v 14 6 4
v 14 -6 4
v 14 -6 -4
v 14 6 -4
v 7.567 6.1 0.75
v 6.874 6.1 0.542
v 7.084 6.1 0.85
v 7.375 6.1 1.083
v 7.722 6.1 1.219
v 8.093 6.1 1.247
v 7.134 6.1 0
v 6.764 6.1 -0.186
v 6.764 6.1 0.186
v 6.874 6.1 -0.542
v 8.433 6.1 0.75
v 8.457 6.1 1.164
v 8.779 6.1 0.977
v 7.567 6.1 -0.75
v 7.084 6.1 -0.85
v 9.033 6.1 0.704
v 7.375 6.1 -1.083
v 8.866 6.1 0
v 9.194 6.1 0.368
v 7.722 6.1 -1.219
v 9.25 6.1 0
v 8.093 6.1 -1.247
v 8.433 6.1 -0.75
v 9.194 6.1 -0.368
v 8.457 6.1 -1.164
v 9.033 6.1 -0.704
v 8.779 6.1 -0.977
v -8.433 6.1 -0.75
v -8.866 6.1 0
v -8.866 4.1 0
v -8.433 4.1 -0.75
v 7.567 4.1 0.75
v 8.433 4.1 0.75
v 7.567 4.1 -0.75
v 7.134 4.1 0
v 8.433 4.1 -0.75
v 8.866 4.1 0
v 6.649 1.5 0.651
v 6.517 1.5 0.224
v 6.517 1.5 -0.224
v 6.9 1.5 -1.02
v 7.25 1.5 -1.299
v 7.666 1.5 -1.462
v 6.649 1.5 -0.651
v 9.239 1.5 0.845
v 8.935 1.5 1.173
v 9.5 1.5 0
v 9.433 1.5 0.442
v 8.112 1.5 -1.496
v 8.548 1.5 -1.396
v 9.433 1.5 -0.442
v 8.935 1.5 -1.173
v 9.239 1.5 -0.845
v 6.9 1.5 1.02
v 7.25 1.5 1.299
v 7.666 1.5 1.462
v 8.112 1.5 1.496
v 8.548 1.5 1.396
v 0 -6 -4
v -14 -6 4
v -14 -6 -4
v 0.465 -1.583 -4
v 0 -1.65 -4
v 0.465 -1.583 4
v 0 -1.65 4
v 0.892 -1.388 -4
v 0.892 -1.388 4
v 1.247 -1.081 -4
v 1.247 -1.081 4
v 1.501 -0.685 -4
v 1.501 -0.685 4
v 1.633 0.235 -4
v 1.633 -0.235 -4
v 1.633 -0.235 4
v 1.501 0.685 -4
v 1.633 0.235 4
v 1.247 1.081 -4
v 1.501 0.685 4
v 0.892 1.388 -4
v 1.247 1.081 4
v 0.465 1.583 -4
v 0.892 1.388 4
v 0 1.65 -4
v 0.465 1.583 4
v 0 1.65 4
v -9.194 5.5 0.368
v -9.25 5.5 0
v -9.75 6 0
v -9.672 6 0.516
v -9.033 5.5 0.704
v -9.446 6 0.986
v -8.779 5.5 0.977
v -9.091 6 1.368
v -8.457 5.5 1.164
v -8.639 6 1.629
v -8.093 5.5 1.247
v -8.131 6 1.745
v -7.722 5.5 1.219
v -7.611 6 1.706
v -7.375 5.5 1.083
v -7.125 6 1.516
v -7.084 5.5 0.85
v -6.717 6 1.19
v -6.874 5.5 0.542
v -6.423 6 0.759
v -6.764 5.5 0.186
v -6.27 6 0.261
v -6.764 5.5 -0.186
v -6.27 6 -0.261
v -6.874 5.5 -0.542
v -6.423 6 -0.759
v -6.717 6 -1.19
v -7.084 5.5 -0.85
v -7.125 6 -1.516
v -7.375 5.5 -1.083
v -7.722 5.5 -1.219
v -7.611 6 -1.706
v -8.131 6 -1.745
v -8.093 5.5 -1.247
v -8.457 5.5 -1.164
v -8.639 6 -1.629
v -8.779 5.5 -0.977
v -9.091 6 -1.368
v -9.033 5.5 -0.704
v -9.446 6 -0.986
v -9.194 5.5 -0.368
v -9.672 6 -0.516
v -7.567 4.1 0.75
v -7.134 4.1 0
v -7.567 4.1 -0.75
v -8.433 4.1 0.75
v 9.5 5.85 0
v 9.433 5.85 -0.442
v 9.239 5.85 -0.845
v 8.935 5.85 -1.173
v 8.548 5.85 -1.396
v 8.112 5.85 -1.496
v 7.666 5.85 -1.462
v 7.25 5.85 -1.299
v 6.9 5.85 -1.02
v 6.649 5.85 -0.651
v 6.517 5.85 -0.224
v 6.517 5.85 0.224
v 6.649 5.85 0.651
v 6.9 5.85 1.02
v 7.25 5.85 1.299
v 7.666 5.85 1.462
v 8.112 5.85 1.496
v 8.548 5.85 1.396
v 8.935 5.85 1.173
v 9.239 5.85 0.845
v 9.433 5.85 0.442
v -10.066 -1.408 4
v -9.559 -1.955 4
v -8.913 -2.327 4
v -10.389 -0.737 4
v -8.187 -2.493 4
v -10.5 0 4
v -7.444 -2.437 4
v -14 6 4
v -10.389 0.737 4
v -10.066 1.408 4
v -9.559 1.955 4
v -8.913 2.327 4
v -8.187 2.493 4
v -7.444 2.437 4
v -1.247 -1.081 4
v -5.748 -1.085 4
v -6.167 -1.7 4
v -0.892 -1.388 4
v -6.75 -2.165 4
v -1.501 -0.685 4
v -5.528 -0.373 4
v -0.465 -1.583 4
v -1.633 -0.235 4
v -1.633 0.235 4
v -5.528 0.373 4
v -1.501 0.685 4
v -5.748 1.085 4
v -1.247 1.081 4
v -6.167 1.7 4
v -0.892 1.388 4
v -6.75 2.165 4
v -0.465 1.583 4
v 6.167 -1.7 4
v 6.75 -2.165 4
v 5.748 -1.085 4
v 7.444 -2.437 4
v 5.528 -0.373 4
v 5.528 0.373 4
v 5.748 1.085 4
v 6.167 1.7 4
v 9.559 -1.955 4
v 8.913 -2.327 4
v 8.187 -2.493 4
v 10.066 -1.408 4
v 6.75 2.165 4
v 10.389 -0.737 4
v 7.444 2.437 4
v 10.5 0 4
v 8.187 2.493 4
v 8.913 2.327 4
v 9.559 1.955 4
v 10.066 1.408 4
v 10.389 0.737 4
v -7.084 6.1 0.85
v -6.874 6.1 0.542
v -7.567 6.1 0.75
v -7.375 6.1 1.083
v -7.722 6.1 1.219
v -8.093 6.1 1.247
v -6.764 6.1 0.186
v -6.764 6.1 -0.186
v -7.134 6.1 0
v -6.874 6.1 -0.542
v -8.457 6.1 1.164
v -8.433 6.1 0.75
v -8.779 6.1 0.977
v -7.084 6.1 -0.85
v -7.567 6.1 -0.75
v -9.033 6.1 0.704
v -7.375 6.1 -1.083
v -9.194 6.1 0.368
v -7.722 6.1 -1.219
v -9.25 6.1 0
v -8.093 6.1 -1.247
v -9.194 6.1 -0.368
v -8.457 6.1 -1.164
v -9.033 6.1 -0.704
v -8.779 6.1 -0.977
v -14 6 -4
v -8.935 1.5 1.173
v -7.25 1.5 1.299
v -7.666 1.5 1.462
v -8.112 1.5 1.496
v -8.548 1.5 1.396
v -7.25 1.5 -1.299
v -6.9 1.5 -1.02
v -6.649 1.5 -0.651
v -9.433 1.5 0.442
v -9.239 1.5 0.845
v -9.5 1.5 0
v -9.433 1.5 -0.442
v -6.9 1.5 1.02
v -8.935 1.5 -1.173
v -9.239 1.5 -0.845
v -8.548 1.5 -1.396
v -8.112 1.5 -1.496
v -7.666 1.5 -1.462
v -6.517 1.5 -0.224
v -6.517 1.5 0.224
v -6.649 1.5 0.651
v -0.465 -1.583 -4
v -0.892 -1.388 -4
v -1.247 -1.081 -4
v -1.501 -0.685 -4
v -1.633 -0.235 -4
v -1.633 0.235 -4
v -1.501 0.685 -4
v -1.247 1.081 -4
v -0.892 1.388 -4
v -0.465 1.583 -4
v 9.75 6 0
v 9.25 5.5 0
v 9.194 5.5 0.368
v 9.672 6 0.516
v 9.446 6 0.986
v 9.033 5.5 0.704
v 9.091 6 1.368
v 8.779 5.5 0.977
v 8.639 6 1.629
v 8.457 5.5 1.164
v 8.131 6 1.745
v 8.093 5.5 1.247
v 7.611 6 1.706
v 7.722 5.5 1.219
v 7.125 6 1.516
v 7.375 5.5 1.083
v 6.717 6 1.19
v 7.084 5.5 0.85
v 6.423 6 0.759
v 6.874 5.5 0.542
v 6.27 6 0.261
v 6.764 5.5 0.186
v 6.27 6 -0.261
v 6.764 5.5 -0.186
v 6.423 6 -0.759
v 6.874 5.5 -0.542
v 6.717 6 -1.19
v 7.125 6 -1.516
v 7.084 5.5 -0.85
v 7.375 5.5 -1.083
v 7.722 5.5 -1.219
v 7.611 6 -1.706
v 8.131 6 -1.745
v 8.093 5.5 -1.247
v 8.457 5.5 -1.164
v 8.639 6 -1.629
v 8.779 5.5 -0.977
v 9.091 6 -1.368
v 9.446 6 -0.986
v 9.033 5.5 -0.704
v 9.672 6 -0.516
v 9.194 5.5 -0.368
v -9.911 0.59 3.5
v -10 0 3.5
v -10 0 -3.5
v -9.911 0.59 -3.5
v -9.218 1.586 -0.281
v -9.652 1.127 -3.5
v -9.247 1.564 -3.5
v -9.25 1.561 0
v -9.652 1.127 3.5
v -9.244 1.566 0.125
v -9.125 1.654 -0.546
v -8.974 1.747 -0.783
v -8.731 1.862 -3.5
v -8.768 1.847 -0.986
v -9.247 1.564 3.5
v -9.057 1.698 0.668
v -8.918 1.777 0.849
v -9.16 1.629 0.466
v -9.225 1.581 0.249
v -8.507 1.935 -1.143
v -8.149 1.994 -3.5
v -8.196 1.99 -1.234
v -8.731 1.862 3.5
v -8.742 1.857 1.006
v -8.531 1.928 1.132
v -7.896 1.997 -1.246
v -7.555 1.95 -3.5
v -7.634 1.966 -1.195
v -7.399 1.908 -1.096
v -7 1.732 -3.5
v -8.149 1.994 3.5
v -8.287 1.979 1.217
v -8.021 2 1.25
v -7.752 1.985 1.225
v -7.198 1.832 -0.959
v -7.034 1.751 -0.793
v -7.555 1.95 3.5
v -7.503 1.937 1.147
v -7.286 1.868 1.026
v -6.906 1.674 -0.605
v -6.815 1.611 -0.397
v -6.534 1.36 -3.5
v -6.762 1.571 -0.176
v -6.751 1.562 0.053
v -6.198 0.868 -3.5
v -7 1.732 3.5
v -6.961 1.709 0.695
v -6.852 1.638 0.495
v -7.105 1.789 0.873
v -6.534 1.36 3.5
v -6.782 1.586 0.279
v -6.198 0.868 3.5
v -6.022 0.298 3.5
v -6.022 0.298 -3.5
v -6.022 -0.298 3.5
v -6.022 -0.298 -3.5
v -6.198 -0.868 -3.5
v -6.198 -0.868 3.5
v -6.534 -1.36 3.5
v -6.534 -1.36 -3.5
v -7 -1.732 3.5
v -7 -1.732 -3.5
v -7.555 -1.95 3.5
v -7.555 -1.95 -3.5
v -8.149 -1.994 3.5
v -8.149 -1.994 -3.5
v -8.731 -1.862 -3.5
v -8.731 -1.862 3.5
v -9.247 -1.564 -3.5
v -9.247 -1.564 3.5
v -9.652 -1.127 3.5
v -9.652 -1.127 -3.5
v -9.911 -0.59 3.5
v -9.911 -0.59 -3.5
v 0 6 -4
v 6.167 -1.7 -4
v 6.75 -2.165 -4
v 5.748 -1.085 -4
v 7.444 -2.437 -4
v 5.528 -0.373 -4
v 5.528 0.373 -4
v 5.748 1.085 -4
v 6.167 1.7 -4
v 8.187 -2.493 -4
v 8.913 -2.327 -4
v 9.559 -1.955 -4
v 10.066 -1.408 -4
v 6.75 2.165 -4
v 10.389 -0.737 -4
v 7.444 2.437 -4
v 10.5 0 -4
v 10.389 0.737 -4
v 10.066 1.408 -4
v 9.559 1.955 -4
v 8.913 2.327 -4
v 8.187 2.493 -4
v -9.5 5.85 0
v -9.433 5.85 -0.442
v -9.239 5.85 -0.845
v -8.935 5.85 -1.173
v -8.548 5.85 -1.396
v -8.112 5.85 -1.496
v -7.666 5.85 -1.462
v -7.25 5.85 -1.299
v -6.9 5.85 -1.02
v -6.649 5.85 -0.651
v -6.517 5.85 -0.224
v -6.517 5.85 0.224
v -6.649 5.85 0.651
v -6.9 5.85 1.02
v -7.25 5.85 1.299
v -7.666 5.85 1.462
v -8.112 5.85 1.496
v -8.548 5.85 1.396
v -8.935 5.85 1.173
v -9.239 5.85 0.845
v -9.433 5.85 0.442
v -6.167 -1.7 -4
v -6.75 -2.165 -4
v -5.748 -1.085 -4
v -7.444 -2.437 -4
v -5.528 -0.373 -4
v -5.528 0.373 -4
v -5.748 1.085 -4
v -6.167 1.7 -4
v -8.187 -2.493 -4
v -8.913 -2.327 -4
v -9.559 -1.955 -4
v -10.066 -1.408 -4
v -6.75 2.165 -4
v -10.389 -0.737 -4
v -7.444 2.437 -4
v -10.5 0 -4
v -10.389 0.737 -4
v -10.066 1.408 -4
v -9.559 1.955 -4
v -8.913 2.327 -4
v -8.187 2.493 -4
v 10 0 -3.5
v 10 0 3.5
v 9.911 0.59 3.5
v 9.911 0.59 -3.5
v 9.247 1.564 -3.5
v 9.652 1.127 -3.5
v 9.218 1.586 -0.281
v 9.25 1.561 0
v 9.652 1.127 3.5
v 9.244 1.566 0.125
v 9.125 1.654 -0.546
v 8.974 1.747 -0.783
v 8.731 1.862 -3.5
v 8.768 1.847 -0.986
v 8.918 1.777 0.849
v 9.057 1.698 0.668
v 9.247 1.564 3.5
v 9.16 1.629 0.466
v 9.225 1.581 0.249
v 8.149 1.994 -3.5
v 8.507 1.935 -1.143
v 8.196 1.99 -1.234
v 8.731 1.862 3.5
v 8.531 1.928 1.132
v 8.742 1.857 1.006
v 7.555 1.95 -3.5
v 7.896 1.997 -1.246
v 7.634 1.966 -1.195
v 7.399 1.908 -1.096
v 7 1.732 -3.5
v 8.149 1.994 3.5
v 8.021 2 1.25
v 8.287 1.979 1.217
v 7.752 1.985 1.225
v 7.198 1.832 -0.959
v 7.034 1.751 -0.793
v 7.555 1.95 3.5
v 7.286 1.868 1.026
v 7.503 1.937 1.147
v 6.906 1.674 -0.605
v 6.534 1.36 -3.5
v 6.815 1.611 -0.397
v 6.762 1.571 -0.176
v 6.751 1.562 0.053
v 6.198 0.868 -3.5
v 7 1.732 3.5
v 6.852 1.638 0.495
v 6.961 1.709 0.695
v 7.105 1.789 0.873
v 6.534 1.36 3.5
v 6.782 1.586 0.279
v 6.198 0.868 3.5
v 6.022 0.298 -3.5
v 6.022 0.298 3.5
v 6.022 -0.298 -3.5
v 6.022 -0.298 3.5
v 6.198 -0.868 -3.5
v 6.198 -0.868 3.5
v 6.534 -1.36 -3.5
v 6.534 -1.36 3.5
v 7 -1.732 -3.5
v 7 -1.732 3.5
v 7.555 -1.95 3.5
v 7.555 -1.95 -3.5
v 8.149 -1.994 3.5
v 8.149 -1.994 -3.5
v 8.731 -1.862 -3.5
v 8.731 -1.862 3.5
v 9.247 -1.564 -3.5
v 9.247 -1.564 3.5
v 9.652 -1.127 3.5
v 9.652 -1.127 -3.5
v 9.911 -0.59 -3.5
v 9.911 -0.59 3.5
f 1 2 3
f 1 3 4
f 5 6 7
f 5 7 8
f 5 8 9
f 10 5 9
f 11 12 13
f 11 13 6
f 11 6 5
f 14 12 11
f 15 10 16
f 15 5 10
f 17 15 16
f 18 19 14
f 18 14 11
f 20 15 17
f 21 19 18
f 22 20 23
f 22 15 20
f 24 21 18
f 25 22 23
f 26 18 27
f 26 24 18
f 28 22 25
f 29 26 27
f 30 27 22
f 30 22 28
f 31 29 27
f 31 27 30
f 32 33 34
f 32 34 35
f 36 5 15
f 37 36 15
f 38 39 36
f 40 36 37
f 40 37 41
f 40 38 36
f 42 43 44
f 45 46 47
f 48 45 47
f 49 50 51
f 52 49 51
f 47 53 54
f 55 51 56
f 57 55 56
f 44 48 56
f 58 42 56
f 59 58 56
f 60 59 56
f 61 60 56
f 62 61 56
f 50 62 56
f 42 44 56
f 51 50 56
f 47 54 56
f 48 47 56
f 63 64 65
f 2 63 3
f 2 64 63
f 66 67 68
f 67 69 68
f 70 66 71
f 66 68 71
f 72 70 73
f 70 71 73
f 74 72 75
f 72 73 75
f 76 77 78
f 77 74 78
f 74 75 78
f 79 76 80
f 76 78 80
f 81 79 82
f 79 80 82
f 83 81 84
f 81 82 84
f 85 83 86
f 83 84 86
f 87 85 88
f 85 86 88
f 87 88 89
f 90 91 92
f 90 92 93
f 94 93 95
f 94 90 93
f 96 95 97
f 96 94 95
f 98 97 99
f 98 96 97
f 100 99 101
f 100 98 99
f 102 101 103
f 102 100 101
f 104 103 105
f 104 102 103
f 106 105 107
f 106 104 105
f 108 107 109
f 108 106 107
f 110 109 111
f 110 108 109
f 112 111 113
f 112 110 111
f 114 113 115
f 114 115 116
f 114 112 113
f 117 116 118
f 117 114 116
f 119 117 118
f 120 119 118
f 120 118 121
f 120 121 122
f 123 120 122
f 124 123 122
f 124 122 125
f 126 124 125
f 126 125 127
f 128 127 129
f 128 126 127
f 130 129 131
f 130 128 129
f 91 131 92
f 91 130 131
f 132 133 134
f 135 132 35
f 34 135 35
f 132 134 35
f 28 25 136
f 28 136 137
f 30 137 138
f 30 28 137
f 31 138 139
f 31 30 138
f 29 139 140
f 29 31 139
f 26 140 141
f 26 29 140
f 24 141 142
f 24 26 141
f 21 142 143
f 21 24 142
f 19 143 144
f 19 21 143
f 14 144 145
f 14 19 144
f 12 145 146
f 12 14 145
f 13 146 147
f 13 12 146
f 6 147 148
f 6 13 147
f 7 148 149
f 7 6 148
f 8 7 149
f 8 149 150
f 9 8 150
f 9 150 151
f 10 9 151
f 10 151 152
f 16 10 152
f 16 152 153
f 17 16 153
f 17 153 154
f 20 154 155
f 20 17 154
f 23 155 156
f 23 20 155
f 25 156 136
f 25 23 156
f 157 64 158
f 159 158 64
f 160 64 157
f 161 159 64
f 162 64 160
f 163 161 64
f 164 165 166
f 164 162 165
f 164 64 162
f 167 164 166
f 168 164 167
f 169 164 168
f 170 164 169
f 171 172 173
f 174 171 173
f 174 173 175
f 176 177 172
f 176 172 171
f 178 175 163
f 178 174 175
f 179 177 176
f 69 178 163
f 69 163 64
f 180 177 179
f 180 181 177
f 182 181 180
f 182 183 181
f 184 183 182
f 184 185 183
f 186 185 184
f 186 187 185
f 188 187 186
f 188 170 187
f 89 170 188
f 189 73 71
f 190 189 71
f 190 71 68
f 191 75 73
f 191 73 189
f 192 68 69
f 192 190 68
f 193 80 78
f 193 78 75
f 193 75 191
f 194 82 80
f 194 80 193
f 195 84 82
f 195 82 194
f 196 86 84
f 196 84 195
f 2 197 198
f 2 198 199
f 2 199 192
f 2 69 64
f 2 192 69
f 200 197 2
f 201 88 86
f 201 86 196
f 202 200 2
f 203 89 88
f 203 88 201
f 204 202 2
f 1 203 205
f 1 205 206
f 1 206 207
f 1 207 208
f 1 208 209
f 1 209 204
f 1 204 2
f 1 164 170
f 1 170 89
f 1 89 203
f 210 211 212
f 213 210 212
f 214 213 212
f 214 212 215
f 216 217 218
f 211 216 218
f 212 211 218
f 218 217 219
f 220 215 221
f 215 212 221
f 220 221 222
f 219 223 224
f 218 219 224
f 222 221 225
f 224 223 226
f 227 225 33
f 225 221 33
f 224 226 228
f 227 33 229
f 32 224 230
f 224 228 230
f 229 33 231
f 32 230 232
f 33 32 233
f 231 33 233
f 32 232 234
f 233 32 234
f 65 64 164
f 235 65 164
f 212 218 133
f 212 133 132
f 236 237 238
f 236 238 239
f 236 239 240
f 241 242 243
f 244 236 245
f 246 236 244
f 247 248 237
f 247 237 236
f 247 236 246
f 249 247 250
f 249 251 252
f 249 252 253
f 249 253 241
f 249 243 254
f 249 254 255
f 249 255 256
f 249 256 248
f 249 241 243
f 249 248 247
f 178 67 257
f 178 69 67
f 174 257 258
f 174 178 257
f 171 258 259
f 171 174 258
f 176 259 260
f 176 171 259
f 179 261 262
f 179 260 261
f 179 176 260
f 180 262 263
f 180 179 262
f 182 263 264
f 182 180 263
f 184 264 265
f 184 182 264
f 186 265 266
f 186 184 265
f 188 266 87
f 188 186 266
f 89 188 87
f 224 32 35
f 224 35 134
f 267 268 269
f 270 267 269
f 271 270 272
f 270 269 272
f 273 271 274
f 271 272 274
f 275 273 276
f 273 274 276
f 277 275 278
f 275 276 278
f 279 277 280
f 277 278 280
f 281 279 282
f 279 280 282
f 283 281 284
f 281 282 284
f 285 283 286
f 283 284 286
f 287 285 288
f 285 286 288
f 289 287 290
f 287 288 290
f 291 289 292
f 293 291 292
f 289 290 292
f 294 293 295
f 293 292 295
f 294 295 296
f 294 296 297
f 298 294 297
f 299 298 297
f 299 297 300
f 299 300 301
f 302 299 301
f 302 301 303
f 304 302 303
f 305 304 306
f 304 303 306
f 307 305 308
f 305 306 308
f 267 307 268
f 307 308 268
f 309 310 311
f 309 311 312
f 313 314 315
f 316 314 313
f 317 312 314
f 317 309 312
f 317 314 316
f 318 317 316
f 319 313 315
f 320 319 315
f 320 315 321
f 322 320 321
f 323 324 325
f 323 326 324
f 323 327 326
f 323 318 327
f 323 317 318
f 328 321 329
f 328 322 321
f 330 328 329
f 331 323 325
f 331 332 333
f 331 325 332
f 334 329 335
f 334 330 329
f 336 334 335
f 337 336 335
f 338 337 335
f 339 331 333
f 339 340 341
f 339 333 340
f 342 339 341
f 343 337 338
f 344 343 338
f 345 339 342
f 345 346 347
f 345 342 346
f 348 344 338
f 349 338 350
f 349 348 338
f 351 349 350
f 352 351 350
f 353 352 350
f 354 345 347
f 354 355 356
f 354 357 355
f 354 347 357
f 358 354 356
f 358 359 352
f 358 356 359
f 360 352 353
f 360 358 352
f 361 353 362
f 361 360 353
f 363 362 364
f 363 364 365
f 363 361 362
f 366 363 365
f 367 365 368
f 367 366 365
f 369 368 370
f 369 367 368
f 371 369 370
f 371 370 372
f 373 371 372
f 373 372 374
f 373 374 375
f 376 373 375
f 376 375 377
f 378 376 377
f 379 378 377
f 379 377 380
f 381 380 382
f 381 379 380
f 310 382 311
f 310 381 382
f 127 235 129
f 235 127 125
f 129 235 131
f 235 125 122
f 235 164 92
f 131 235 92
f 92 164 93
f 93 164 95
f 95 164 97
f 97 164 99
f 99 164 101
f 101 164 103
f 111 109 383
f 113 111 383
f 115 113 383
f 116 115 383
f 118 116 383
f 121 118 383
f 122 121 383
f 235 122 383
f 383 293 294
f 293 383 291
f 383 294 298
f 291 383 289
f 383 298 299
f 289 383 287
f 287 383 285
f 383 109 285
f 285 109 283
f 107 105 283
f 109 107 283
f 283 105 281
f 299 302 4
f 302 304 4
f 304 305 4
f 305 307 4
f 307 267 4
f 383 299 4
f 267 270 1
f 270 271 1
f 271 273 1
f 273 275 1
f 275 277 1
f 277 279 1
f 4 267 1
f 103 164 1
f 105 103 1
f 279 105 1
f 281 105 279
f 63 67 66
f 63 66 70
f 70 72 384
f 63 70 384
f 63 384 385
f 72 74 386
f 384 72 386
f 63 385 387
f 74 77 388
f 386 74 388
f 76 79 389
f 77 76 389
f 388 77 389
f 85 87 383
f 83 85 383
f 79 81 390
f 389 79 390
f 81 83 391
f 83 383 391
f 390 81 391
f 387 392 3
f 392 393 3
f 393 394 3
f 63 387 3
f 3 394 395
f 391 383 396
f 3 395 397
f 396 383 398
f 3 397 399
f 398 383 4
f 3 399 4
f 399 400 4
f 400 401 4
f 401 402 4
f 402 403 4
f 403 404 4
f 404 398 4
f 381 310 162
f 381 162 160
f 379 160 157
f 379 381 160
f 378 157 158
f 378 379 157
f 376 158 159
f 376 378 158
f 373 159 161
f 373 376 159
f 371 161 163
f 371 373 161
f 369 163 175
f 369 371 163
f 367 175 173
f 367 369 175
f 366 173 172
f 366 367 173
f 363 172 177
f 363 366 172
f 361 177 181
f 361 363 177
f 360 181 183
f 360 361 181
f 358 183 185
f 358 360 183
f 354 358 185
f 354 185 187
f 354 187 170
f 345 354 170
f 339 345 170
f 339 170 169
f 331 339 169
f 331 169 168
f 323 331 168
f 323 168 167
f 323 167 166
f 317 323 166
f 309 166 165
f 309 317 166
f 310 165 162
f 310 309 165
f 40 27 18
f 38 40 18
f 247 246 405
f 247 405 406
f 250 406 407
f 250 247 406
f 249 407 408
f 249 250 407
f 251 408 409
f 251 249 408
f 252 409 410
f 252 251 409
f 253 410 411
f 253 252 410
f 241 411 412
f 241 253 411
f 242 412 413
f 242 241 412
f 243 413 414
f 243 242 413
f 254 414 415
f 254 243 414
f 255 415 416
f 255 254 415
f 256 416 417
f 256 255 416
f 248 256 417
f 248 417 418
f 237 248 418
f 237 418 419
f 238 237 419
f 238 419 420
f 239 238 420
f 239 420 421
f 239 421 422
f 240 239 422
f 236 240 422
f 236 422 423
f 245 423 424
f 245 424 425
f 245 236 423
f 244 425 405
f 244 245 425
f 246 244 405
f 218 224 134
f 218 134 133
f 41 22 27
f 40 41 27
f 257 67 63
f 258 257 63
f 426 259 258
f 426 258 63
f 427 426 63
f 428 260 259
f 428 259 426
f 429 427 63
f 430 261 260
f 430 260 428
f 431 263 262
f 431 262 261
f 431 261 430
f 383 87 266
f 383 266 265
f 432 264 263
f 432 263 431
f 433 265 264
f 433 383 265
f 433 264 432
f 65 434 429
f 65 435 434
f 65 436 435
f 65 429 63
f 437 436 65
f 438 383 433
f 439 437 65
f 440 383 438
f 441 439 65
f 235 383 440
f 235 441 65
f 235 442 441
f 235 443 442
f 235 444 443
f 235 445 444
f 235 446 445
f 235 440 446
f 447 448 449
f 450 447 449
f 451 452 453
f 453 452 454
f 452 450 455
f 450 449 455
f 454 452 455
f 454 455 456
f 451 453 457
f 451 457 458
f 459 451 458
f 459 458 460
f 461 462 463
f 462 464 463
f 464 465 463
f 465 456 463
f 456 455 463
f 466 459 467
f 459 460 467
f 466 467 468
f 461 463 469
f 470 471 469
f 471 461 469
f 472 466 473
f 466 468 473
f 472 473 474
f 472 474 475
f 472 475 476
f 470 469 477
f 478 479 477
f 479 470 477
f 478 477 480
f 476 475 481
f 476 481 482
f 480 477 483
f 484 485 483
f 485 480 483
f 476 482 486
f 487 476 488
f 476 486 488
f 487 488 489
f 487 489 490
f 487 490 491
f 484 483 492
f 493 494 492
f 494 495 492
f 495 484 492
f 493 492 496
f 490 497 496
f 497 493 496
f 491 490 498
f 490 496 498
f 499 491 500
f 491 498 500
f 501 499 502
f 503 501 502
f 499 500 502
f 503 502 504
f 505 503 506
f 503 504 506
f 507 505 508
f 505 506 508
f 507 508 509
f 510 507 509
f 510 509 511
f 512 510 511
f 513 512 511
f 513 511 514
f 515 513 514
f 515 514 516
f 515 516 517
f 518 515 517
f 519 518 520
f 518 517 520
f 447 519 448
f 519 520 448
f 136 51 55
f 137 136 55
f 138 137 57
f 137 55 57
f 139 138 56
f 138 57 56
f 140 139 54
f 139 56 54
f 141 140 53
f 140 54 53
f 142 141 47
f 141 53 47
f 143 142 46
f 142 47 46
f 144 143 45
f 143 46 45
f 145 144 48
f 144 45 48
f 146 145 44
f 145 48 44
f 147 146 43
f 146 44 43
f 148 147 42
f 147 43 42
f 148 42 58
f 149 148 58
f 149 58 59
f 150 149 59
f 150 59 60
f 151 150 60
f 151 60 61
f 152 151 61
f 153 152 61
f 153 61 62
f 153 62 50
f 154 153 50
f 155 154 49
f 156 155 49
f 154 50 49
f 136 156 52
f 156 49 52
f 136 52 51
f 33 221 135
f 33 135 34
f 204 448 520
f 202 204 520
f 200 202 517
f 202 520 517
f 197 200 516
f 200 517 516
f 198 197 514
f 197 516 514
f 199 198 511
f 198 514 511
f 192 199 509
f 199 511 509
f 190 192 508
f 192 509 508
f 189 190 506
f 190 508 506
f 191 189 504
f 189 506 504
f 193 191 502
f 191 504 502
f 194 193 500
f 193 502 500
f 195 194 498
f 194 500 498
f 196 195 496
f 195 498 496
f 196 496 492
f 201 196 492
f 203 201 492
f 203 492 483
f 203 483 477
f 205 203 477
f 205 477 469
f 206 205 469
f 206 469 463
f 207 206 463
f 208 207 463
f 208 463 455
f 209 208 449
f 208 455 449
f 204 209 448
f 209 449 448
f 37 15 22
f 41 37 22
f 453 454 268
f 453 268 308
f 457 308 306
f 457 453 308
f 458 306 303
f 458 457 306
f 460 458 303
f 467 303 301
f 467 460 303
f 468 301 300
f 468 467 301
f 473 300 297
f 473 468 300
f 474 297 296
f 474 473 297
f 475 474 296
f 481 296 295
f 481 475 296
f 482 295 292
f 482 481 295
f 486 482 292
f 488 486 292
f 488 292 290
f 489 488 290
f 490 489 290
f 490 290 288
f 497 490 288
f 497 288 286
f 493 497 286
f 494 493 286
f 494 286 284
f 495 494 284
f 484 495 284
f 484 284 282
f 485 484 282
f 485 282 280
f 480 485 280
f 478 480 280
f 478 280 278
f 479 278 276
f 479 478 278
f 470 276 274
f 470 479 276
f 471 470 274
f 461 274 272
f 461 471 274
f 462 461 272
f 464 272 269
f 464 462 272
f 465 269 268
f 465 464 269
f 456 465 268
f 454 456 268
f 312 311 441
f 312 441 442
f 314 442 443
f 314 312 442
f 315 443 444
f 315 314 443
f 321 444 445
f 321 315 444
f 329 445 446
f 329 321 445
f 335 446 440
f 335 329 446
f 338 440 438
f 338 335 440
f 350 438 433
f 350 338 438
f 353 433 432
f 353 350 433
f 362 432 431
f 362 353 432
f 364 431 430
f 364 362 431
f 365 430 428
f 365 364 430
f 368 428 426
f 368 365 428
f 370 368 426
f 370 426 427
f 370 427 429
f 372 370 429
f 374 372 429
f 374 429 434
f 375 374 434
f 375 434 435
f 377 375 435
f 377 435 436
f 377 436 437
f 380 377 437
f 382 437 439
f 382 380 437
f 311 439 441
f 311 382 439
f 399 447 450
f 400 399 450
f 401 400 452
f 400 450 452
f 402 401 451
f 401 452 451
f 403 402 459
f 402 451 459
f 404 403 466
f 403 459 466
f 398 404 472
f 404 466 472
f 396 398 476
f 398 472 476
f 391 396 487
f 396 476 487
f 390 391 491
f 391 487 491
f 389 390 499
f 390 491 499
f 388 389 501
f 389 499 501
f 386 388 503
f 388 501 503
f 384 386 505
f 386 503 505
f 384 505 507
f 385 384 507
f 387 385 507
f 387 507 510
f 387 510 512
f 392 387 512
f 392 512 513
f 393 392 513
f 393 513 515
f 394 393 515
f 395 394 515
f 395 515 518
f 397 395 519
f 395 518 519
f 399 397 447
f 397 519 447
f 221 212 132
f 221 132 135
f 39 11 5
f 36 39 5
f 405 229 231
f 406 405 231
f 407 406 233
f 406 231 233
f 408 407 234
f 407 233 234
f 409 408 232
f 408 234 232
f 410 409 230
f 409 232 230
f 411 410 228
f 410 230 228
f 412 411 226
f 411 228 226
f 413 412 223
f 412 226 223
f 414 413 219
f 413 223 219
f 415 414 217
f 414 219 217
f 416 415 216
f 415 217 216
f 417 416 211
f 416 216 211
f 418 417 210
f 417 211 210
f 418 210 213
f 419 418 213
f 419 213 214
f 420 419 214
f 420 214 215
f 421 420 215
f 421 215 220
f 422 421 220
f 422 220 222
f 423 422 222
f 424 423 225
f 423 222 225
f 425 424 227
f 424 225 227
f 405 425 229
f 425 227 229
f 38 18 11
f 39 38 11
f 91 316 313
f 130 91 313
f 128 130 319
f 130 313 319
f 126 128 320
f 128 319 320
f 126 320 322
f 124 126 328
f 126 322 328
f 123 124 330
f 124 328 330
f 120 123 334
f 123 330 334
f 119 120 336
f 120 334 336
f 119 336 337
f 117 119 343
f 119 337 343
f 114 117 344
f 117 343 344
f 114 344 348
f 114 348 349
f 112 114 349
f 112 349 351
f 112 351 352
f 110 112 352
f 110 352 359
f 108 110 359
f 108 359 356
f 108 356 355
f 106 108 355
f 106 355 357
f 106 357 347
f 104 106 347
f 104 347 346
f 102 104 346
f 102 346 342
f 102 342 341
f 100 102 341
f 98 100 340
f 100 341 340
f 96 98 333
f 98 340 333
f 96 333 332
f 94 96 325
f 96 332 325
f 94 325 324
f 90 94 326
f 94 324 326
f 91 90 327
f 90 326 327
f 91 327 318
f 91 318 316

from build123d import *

# Parameters (mm, degrees)
SKETCH1_W               = 14
SKETCH1_H               = 12
BOSS_EXTRUDE1_DEPTH     = 4
SKETCH2_R               = 2
CUT_EXTRUDE1_DEPTH      = 5
CUT_EXTRUDE1_DEPTH_BACK = 5
SKETCH3_R               = 1.65
CUT_EXTRUDE2_DEPTH      = 9
SKETCH4_R               = 1.25
CUT_EXTRUDE3_DEPTH      = 7
SKETCH5_R               = 1.5
BOSS_EXTRUDE2_DEPTH     = 4.6
CHAMFER1_SIZE           = 0.25
CHAMFER2_SIZE           = 0.5
CUT_EXTRUDE4_DEPTH      = 2


with BuildPart() as part:
    # Sketch1 → Boss-Extrude1 (new body, symmetric)
    with BuildSketch(Plane.XY):
        with Locations((7, 0)):
            Rectangle(SKETCH1_W, SKETCH1_H)
    extrude(amount=BOSS_EXTRUDE1_DEPTH, both=True)

    # Sketch2 → Cut-Extrude1 (cut, two sides)
    with BuildSketch(Plane.XY) as cut_extrude1_sk:
        with Locations((8, 0)):
            Circle(SKETCH2_R)
    extrude(amount=CUT_EXTRUDE1_DEPTH, mode=Mode.SUBTRACT)
    extrude(cut_extrude1_sk.sketch, amount=-CUT_EXTRUDE1_DEPTH_BACK, mode=Mode.SUBTRACT)

    # Sketch3 → Cut-Extrude2 (cut, through all)
    with BuildSketch(Plane.XY.offset(4)):
        Circle(SKETCH3_R)
    extrude(amount=-CUT_EXTRUDE2_DEPTH, mode=Mode.SUBTRACT)

    # Sketch4 → Cut-Extrude3 (cut, through all)
    with BuildSketch(Plane(origin=(0, 0, 0), x_dir=(1, 0, 0), z_dir=(0, 1, 0))):
        with Locations((8, 0)):
            Circle(SKETCH4_R)
    extrude(amount=CUT_EXTRUDE3_DEPTH, mode=Mode.SUBTRACT)

    # Chamfer2
    chamfer2_edges = [part.edges().sort_by_distance(p)[0] for p in [
        (6, 0, -4),
        (6, 0, 4),
        (6.75, 6, 0),
    ]]
    chamfer(chamfer2_edges, length=CHAMFER2_SIZE)


with BuildPart() as body_2:
    # Sketch5 → Boss-Extrude2 (new body)
    with BuildSketch(Plane(origin=(0, 1.5, 0), x_dir=(1, 0, 0), z_dir=(0, 1, 0))):
        with Locations((8, 0)):
            Circle(SKETCH5_R)
    extrude(amount=BOSS_EXTRUDE2_DEPTH)

    # Chamfer1
    chamfer1_edges = [body_2.edges().sort_by_distance(p)[0] for p in [
        (6.5, 6.1, 0),
    ]]
    chamfer(chamfer1_edges, length=CHAMFER1_SIZE)

    # Sketch6 → Cut-Extrude4 (cut)
    with BuildSketch(Plane(origin=(0, 6.1, 0), x_dir=(1, 0, 0), z_dir=(0, 1, 0))):
        Polygon((7.133974596, 0), (7.566987298, -0.75), (8.433012702, -0.75), (8.866025404, 0), (8.433012702, 0.75), (7.566987298, 0.75), align=None)
    extrude(amount=-CUT_EXTRUDE4_DEPTH, mode=Mode.SUBTRACT)


with BuildPart() as body_3:
    # Mirror1: mirrored copy
    add(part.part.mirror(Plane(origin=(0, 0, 0), x_dir=(0, 0, 1), z_dir=(1, 0, 0))))

    # Combine1: union part
    add(part.part)


with BuildPart() as body_4:
    # Mirror1 2: mirrored copy
    add(body_2.part.mirror(Plane(origin=(0, 0, 0), x_dir=(0, 0, 1), z_dir=(1, 0, 0))))


solid = Compound([body_2.part, body_3.part, body_4.part])
